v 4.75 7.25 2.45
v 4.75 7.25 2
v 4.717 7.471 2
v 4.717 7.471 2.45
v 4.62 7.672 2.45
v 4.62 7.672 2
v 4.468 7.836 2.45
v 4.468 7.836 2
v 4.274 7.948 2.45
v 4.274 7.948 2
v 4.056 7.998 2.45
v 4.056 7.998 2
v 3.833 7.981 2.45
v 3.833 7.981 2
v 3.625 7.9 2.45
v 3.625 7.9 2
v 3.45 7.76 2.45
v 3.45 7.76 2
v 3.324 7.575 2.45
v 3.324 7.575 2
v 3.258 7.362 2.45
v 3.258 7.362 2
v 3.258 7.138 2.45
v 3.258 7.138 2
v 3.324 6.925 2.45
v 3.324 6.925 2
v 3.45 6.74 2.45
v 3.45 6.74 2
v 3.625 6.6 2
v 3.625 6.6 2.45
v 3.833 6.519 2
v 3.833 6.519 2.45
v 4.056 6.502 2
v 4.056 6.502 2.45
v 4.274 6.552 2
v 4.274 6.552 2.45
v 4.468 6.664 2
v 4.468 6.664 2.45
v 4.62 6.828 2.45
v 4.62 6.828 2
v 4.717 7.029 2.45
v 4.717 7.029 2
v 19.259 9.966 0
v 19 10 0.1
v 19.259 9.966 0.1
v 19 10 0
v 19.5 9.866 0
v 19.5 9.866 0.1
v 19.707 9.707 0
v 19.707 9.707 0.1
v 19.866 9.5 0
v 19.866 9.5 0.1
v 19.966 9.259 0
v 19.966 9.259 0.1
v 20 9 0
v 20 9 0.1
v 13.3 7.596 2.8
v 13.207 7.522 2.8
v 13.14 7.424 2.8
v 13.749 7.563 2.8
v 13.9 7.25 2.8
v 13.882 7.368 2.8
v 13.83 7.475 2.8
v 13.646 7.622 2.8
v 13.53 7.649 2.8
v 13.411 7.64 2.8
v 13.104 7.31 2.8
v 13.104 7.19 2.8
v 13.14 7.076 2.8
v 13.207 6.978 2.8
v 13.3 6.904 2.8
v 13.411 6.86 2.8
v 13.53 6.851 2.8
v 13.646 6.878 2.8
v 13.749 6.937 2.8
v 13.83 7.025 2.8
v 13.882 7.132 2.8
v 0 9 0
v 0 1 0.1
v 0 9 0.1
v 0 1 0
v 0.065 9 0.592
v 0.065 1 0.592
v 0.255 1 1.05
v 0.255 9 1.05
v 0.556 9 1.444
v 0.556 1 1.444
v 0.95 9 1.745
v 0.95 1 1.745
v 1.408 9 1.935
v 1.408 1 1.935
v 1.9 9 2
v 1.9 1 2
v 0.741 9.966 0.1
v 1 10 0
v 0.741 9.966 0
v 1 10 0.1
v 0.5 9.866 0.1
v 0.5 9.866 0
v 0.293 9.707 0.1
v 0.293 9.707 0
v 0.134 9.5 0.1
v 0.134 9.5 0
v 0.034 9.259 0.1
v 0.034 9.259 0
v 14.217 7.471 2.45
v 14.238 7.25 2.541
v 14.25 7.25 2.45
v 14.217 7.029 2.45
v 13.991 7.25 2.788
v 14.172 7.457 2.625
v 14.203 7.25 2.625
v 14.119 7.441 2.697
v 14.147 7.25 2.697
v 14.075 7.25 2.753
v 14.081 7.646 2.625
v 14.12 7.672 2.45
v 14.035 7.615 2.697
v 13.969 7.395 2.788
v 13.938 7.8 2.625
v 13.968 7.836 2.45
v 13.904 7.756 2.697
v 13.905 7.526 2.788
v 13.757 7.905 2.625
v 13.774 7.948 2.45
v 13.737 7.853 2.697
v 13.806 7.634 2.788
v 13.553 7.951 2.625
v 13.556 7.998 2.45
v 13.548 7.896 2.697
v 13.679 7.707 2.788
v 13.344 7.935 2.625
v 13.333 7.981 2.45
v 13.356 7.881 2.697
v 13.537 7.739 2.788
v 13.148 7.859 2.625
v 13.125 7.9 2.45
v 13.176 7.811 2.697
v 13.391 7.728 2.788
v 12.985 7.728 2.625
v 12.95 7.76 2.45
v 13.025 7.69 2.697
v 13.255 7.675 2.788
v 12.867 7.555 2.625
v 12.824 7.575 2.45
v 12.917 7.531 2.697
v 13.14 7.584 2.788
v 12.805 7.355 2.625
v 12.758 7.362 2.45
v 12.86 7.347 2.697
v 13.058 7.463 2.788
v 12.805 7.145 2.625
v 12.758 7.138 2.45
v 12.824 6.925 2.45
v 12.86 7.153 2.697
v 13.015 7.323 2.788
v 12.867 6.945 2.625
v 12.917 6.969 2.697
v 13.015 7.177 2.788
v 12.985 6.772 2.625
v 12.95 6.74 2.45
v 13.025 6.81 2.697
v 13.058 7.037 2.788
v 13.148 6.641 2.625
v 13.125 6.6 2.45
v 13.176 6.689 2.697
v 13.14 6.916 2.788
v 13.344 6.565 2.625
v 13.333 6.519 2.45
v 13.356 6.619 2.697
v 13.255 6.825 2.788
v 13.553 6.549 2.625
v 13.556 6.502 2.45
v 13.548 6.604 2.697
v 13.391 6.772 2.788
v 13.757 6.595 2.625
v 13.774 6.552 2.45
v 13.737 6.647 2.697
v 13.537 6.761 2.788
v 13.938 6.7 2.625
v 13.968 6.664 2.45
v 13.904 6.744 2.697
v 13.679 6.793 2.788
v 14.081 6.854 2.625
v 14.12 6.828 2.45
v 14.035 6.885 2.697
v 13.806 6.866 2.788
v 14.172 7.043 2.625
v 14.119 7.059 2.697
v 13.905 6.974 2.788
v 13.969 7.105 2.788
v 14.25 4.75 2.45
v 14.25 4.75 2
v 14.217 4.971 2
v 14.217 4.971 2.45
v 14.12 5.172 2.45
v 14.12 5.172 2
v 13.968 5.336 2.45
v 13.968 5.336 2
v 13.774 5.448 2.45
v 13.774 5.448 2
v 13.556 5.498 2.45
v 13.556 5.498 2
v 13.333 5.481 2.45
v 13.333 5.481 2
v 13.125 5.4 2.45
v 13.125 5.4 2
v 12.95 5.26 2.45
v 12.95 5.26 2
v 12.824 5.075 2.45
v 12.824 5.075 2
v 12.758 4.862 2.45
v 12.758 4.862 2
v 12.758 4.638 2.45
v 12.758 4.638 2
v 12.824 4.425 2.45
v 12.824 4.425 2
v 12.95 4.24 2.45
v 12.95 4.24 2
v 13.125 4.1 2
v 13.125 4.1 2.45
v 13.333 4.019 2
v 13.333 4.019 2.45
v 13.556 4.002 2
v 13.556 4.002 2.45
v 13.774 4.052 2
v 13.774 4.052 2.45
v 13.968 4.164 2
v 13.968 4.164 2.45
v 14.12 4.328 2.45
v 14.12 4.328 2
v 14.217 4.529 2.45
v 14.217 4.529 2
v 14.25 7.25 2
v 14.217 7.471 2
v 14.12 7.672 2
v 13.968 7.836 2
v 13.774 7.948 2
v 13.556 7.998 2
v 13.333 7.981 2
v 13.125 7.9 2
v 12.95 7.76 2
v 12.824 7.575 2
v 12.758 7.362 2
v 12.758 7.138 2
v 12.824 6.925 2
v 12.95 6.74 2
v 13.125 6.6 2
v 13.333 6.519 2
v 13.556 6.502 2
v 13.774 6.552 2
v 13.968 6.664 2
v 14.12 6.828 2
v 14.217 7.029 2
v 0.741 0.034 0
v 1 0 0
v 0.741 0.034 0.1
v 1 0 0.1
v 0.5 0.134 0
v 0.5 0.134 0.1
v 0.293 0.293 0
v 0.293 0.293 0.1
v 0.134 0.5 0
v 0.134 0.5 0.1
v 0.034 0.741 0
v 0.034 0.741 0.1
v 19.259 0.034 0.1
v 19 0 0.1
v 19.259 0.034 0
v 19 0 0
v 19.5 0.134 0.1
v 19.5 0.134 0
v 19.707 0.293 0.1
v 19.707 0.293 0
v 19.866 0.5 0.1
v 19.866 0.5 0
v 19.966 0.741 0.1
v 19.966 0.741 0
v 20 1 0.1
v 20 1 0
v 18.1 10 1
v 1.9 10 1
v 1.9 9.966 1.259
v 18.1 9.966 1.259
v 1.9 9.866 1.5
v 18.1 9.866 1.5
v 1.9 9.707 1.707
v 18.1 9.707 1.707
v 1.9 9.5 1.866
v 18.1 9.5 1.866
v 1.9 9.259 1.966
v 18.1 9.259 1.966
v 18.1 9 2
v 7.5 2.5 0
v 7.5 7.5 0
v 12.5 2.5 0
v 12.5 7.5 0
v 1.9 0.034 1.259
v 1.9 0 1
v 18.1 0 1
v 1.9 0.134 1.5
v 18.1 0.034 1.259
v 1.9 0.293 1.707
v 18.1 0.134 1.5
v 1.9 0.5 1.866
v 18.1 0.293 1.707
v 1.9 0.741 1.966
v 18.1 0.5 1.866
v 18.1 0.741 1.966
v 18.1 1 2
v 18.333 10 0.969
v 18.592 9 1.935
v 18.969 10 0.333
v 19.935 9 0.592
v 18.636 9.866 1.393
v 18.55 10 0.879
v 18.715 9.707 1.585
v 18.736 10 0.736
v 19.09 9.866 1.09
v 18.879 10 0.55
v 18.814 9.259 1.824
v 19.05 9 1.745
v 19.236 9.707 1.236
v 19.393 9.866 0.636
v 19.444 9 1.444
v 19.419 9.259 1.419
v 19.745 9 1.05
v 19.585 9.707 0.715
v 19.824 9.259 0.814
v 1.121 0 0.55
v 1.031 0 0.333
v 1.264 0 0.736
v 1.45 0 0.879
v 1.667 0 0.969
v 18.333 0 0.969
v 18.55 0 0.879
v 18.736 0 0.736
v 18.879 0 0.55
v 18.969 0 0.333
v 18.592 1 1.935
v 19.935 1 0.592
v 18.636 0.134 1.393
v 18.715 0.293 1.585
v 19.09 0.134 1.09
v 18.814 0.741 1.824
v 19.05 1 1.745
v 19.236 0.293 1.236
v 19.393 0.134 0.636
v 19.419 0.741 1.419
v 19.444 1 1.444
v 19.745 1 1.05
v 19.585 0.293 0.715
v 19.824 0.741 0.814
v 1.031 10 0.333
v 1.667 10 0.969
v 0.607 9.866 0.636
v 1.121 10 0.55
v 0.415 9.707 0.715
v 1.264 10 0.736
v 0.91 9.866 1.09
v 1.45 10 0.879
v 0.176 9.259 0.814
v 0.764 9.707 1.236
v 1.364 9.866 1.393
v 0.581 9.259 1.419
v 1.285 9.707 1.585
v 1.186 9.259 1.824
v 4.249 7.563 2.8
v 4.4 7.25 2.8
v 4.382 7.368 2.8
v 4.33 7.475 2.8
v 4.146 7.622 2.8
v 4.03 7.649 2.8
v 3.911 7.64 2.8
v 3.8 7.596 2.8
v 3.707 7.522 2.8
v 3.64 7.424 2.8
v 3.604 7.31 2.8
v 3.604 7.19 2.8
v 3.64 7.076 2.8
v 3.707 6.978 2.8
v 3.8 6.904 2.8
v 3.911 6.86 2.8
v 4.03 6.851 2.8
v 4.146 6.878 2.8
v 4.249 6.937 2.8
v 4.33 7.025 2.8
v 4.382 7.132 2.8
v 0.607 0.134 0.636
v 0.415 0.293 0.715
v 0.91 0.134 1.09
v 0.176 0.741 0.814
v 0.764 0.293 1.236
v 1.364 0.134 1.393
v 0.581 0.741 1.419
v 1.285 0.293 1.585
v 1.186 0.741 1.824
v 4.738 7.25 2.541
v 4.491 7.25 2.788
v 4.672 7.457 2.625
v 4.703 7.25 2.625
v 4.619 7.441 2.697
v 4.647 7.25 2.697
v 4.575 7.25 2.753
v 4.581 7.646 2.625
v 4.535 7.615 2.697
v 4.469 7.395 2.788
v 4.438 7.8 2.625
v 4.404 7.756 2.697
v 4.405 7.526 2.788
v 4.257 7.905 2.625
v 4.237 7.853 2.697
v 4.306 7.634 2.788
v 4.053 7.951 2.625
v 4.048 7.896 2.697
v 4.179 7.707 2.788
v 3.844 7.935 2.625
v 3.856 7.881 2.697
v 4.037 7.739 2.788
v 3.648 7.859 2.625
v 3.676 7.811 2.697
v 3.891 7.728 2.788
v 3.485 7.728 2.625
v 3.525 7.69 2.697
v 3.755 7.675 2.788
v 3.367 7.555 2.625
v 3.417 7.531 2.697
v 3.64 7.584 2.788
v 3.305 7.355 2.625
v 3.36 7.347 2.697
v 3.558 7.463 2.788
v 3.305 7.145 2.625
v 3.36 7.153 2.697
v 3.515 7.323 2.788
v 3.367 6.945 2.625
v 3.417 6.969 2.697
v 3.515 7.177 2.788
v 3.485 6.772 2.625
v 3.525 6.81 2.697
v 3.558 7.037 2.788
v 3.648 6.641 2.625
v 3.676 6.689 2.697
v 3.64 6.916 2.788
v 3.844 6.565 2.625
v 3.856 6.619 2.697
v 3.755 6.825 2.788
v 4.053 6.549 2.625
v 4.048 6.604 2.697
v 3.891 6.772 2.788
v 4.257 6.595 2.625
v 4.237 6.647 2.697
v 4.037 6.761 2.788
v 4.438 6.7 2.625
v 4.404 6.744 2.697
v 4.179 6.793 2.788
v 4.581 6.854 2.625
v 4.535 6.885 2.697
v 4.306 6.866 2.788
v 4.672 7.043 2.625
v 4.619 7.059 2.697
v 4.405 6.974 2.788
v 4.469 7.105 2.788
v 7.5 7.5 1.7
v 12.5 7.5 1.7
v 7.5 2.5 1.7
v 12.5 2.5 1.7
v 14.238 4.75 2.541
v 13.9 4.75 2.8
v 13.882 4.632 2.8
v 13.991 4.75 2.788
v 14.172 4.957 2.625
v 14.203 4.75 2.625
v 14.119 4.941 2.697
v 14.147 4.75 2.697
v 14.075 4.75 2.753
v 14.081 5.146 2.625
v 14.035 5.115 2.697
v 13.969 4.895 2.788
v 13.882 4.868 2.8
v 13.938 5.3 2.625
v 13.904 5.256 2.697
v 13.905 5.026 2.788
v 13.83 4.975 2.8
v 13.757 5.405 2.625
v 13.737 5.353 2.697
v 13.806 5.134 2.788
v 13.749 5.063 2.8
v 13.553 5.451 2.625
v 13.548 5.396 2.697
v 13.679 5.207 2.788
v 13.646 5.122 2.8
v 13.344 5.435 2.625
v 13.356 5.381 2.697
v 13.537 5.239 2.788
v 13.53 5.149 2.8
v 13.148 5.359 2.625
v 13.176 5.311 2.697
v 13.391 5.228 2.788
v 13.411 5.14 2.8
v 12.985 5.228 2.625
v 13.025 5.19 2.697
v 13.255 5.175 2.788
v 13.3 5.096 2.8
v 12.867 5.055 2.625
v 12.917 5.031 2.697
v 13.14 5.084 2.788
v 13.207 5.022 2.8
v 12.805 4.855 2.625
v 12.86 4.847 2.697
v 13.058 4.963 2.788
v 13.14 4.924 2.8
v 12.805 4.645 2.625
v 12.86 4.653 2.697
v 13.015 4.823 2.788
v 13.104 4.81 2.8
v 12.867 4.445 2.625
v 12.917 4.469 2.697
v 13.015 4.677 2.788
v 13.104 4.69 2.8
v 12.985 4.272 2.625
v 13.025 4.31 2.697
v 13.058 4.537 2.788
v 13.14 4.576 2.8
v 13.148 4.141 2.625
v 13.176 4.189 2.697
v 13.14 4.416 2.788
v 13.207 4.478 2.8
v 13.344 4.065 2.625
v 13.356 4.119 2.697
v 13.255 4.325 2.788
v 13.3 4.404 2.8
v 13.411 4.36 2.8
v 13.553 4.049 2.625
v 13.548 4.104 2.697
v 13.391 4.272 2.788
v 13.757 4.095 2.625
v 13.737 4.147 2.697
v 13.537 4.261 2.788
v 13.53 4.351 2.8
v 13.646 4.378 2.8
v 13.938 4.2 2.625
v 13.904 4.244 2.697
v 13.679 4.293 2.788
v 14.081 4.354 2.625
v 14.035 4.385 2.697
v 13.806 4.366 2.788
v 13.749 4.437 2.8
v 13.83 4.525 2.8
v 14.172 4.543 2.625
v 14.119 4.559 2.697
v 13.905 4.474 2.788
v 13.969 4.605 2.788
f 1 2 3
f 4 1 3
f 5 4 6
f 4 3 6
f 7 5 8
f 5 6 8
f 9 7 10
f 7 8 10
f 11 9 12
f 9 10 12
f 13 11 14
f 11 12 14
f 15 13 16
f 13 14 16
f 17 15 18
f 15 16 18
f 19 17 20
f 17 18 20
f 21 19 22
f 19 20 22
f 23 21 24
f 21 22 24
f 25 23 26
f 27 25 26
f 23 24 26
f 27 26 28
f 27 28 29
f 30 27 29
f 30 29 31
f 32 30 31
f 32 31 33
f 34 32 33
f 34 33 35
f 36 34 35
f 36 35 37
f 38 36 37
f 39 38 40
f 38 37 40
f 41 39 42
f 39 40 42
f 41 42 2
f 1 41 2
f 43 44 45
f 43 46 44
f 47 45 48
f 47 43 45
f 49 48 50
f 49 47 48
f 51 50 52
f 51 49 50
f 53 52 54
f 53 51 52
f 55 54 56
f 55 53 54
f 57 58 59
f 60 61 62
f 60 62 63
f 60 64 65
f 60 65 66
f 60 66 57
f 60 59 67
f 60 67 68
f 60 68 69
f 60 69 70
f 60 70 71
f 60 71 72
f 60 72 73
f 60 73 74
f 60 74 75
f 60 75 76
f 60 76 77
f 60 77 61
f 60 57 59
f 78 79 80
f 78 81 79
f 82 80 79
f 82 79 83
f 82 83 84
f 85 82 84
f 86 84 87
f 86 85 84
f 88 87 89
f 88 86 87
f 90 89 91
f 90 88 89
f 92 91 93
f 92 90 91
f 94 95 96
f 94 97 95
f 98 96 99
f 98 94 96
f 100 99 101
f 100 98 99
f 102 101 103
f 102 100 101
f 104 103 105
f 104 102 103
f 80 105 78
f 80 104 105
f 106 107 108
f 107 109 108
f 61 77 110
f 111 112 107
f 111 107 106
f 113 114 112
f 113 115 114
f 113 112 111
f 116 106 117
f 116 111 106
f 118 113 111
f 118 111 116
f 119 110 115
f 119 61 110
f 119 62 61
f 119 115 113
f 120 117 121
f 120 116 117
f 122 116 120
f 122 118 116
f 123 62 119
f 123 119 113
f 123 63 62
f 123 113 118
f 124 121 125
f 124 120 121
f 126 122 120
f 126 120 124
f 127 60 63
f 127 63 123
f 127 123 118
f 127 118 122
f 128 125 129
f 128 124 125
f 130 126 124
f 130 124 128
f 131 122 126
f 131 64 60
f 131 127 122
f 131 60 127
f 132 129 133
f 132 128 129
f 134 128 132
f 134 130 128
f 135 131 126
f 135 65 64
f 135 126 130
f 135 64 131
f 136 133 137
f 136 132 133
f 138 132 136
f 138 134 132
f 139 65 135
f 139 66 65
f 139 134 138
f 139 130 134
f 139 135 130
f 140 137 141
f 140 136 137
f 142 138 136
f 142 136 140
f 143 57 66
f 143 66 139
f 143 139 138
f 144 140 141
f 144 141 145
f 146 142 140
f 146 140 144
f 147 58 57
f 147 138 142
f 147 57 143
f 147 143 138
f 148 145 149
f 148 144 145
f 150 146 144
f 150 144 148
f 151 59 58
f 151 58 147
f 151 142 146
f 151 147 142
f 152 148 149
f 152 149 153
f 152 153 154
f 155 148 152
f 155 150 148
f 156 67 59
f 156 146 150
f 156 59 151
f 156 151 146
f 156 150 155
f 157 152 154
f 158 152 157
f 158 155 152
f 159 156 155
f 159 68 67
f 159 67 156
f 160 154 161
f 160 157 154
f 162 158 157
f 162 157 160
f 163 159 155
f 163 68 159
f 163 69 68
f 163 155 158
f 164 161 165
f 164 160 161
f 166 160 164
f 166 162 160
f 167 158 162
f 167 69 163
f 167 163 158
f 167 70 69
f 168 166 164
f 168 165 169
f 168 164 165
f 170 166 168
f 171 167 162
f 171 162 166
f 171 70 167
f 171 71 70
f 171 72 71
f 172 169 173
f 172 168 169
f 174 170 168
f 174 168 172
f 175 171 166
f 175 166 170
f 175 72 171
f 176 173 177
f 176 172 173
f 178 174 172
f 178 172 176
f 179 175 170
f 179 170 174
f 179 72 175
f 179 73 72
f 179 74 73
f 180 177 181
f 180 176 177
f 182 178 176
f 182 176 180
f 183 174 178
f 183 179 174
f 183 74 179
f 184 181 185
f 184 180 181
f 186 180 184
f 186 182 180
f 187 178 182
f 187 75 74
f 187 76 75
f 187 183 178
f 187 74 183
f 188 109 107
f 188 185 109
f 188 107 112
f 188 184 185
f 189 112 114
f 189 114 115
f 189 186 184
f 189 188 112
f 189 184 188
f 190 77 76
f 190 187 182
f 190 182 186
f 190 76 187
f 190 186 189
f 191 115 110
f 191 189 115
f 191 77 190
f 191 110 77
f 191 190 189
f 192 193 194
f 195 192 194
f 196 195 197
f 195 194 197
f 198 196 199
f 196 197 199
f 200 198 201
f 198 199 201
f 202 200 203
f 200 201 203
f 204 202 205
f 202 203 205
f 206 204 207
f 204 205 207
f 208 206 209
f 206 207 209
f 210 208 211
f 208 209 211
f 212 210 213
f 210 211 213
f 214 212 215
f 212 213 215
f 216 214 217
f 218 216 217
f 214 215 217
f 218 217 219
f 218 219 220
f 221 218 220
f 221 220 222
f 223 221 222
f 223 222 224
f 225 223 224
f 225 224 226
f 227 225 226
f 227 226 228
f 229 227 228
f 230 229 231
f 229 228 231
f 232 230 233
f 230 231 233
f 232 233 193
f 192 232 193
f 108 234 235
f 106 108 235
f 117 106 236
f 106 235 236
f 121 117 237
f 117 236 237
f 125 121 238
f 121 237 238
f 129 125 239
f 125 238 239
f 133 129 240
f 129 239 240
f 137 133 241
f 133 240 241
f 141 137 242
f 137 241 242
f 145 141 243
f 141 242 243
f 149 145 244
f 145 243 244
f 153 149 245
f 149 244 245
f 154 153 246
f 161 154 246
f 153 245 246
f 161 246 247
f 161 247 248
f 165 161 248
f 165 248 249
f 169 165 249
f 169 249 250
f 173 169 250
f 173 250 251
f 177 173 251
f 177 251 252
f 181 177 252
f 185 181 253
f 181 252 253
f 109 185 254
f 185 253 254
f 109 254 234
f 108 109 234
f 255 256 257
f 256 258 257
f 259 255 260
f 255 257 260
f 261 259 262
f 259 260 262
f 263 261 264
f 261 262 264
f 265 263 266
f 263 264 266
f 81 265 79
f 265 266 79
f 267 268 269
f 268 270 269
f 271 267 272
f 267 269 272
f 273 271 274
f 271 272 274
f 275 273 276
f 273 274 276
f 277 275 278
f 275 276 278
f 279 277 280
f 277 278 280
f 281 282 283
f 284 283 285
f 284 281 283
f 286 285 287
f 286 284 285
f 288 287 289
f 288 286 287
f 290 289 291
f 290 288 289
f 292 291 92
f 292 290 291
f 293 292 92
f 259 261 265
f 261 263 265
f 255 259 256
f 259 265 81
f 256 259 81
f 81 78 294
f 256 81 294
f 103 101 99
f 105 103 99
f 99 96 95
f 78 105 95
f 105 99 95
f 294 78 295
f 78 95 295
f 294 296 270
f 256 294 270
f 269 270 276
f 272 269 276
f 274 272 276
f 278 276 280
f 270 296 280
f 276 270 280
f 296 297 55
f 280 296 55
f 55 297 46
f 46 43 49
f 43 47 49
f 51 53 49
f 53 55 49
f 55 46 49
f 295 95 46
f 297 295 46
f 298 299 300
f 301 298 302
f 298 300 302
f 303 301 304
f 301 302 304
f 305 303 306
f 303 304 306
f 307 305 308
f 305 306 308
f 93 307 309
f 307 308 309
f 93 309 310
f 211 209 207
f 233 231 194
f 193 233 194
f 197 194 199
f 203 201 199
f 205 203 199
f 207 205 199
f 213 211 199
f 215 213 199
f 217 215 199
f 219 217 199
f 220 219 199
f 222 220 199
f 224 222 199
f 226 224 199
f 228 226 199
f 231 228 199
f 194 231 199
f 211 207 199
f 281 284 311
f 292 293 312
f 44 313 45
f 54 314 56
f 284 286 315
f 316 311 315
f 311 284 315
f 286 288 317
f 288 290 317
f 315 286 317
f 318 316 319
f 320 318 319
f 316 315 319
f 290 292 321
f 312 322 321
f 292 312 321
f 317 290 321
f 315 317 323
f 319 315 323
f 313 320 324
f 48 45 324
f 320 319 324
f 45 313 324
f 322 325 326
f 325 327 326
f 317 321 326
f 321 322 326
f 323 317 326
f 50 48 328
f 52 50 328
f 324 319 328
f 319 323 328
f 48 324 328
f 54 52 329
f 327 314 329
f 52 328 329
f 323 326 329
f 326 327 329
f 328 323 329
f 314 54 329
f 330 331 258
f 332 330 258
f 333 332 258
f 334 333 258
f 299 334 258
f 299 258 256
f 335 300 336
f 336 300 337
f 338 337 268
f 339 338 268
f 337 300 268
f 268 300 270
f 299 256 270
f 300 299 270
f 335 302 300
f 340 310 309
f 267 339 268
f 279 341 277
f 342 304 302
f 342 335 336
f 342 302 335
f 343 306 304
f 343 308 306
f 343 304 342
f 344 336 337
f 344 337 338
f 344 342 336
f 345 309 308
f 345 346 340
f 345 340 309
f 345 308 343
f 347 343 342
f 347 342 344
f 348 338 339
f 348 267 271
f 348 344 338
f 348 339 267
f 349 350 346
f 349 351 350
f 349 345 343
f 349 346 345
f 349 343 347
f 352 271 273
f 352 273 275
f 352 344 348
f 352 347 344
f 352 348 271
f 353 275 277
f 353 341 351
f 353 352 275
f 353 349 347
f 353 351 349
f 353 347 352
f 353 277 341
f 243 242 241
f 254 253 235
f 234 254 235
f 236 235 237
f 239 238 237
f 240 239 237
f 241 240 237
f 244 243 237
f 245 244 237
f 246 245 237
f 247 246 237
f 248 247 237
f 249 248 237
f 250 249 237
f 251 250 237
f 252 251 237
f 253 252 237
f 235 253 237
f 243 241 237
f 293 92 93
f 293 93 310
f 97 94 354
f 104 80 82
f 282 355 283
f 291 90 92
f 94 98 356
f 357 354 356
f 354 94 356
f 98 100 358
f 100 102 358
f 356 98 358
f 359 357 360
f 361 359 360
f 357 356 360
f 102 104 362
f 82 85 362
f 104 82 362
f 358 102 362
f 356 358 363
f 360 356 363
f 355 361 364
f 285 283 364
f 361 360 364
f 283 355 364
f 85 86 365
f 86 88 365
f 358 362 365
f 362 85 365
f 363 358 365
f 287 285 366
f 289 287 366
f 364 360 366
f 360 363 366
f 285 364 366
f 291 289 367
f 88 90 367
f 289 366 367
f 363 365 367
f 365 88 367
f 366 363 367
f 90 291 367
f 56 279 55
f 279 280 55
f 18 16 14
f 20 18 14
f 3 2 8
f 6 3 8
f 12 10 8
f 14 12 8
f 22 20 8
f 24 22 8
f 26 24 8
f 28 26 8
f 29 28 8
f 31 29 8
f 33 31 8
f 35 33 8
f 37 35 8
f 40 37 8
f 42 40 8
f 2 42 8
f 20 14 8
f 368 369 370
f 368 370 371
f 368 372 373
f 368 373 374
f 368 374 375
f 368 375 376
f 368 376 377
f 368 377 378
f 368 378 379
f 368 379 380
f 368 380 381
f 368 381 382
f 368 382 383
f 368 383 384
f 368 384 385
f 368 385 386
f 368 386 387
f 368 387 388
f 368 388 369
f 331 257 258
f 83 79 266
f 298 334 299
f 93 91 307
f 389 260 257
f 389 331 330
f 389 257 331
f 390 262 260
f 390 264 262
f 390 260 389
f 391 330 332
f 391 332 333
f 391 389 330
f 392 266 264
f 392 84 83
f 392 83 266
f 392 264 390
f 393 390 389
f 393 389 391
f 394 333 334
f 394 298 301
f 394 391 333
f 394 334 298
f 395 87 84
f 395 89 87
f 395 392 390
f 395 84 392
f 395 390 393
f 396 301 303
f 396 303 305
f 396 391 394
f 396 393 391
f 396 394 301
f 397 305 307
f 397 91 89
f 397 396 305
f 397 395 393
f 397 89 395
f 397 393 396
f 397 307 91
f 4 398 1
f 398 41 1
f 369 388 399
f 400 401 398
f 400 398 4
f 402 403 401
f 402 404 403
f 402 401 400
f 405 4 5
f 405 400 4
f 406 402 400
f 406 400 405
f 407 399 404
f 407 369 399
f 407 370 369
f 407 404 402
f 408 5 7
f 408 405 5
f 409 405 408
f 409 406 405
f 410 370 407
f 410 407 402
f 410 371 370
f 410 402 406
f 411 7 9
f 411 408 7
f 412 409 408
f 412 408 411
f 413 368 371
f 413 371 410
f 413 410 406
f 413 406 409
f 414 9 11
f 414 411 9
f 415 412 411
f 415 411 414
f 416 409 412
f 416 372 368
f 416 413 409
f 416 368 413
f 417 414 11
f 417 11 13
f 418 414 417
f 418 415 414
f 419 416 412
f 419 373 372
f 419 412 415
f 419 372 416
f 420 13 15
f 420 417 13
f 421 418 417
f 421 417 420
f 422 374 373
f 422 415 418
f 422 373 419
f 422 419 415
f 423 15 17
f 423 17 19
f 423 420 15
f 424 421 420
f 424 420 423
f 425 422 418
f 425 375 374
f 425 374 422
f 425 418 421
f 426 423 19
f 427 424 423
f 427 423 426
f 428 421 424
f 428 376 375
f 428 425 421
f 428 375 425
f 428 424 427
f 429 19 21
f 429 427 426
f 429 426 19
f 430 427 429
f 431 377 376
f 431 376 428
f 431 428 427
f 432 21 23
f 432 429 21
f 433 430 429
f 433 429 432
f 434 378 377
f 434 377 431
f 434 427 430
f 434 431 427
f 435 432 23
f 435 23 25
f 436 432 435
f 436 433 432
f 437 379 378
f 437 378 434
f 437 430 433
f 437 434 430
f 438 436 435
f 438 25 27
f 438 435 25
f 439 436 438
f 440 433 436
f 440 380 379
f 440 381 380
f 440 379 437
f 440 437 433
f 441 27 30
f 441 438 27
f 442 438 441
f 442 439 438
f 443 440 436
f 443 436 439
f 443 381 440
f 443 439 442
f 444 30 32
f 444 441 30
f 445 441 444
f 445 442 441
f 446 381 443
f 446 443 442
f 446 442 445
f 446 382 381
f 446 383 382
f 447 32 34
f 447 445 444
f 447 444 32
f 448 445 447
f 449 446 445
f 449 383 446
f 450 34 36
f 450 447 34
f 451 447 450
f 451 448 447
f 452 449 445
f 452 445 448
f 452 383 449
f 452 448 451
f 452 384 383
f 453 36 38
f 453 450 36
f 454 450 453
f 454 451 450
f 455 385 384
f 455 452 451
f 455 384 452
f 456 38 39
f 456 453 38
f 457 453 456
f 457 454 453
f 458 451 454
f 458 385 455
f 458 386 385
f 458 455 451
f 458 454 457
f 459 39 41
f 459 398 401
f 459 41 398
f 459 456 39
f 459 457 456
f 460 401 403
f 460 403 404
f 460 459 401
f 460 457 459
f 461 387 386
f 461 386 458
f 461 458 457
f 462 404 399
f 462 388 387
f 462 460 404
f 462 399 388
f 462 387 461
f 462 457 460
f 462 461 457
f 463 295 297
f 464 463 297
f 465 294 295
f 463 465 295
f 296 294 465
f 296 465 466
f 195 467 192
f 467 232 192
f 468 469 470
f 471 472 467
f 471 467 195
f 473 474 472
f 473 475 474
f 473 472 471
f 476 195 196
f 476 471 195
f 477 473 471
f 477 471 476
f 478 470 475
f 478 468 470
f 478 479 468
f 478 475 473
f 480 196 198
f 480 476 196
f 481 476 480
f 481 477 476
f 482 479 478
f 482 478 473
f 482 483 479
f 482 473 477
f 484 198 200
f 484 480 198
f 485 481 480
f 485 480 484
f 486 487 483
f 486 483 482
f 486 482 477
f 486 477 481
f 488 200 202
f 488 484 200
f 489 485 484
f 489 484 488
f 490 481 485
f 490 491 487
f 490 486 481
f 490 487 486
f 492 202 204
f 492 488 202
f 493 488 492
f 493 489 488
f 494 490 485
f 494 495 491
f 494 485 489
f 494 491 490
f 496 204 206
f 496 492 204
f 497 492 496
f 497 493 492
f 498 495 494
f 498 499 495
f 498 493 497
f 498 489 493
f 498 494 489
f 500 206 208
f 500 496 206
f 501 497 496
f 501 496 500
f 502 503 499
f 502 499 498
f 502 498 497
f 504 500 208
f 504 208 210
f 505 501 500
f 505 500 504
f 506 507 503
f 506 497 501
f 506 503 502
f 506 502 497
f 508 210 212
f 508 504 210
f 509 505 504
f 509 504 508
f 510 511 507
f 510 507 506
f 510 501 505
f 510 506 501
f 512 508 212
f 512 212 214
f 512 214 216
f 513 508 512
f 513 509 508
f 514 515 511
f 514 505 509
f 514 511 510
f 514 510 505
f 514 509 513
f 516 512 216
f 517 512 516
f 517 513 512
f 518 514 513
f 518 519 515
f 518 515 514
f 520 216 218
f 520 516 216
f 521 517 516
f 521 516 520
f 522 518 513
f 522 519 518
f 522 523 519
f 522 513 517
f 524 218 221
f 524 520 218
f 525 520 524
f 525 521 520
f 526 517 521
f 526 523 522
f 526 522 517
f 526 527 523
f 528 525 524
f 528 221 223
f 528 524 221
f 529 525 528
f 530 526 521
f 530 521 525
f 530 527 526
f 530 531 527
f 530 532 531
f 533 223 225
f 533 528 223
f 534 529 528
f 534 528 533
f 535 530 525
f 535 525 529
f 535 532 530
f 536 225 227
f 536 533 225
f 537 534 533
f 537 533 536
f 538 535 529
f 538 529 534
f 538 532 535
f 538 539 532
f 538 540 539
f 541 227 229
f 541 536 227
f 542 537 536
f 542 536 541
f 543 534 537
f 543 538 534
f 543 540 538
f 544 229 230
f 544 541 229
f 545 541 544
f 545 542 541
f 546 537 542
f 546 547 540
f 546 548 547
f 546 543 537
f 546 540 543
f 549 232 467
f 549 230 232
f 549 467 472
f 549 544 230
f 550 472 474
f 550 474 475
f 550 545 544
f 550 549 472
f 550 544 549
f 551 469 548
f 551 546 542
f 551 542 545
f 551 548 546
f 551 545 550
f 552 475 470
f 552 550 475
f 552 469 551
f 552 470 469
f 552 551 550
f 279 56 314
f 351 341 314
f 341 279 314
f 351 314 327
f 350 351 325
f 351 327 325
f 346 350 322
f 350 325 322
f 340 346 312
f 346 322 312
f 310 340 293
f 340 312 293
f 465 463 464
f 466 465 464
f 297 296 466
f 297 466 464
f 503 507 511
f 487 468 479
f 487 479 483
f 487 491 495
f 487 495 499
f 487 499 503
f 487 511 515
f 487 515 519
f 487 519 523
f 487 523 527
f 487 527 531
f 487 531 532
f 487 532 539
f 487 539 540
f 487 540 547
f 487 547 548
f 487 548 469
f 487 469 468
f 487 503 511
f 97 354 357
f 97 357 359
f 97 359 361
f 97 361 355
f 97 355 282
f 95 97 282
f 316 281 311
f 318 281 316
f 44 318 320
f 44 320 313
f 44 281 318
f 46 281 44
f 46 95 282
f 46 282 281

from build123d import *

# Parameters (mm, degrees)
SKETCH001_W  = 5
SKETCH001_H  = 5
PAD_DEPTH    = 1.7
SKETCH_W     = 20
SKETCH_H     = 10
PAD001_DEPTH = 2
FILLET_R     = 1.9
FILLET001_R  = 1
SKETCH002_R  = 0.75
PAD002_DEPTH = 0.8
FILLET002_R  = 0.35


with BuildPart() as pad:
    # Sketch001 → Pad (new body)
    with BuildSketch(Plane.XY):
        with Locations((10, 5)):
            Rectangle(SKETCH001_W, SKETCH001_H)
    extrude(amount=PAD_DEPTH)


with BuildPart() as cut:
    # Sketch → Pad001 (new body)
    with BuildSketch(Plane.XY):
        with Locations((10, 5)):
            Rectangle(SKETCH_W, SKETCH_H)
    extrude(amount=PAD001_DEPTH)

    # Fillet
    fillet_edges = [cut.edges().sort_by_distance(p)[0] for p in [
        (20, 5, 2),
        (0, 5, 2),
    ]]
    fillet(fillet_edges, radius=FILLET_R)

    # Fillet001
    fillet001_edges = [cut.edges().sort_by_distance(p)[0] for p in [
        (10, 0, 2),
        (10, 10, 2),
    ]]
    fillet(fillet001_edges, radius=FILLET001_R)

    # Cut: cut Pad
    add(pad.part, mode=Mode.SUBTRACT)


with BuildPart() as fillet002:
    # Sketch002 → Pad002 (new body)
    with BuildSketch(Plane.XY.offset(2)):
        with Locations((4, 7.25)):
            Circle(SKETCH002_R)
        with Locations((13.5, 7.25)):
            Circle(SKETCH002_R)
        with Locations((13.5, 4.75)):
            Circle(SKETCH002_R)
    extrude(amount=PAD002_DEPTH)

    # Fillet002
    fillet002_edges = [fillet002.edges().sort_by_distance(p)[0] for p in [
        (3.25, 7.25, 2.8),
        (12.75, 7.25, 2.8),
        (12.75, 4.75, 2.8),
    ]]
    fillet(fillet002_edges, radius=FILLET002_R)


solid = Compound([cut.part, fillet002.part])
